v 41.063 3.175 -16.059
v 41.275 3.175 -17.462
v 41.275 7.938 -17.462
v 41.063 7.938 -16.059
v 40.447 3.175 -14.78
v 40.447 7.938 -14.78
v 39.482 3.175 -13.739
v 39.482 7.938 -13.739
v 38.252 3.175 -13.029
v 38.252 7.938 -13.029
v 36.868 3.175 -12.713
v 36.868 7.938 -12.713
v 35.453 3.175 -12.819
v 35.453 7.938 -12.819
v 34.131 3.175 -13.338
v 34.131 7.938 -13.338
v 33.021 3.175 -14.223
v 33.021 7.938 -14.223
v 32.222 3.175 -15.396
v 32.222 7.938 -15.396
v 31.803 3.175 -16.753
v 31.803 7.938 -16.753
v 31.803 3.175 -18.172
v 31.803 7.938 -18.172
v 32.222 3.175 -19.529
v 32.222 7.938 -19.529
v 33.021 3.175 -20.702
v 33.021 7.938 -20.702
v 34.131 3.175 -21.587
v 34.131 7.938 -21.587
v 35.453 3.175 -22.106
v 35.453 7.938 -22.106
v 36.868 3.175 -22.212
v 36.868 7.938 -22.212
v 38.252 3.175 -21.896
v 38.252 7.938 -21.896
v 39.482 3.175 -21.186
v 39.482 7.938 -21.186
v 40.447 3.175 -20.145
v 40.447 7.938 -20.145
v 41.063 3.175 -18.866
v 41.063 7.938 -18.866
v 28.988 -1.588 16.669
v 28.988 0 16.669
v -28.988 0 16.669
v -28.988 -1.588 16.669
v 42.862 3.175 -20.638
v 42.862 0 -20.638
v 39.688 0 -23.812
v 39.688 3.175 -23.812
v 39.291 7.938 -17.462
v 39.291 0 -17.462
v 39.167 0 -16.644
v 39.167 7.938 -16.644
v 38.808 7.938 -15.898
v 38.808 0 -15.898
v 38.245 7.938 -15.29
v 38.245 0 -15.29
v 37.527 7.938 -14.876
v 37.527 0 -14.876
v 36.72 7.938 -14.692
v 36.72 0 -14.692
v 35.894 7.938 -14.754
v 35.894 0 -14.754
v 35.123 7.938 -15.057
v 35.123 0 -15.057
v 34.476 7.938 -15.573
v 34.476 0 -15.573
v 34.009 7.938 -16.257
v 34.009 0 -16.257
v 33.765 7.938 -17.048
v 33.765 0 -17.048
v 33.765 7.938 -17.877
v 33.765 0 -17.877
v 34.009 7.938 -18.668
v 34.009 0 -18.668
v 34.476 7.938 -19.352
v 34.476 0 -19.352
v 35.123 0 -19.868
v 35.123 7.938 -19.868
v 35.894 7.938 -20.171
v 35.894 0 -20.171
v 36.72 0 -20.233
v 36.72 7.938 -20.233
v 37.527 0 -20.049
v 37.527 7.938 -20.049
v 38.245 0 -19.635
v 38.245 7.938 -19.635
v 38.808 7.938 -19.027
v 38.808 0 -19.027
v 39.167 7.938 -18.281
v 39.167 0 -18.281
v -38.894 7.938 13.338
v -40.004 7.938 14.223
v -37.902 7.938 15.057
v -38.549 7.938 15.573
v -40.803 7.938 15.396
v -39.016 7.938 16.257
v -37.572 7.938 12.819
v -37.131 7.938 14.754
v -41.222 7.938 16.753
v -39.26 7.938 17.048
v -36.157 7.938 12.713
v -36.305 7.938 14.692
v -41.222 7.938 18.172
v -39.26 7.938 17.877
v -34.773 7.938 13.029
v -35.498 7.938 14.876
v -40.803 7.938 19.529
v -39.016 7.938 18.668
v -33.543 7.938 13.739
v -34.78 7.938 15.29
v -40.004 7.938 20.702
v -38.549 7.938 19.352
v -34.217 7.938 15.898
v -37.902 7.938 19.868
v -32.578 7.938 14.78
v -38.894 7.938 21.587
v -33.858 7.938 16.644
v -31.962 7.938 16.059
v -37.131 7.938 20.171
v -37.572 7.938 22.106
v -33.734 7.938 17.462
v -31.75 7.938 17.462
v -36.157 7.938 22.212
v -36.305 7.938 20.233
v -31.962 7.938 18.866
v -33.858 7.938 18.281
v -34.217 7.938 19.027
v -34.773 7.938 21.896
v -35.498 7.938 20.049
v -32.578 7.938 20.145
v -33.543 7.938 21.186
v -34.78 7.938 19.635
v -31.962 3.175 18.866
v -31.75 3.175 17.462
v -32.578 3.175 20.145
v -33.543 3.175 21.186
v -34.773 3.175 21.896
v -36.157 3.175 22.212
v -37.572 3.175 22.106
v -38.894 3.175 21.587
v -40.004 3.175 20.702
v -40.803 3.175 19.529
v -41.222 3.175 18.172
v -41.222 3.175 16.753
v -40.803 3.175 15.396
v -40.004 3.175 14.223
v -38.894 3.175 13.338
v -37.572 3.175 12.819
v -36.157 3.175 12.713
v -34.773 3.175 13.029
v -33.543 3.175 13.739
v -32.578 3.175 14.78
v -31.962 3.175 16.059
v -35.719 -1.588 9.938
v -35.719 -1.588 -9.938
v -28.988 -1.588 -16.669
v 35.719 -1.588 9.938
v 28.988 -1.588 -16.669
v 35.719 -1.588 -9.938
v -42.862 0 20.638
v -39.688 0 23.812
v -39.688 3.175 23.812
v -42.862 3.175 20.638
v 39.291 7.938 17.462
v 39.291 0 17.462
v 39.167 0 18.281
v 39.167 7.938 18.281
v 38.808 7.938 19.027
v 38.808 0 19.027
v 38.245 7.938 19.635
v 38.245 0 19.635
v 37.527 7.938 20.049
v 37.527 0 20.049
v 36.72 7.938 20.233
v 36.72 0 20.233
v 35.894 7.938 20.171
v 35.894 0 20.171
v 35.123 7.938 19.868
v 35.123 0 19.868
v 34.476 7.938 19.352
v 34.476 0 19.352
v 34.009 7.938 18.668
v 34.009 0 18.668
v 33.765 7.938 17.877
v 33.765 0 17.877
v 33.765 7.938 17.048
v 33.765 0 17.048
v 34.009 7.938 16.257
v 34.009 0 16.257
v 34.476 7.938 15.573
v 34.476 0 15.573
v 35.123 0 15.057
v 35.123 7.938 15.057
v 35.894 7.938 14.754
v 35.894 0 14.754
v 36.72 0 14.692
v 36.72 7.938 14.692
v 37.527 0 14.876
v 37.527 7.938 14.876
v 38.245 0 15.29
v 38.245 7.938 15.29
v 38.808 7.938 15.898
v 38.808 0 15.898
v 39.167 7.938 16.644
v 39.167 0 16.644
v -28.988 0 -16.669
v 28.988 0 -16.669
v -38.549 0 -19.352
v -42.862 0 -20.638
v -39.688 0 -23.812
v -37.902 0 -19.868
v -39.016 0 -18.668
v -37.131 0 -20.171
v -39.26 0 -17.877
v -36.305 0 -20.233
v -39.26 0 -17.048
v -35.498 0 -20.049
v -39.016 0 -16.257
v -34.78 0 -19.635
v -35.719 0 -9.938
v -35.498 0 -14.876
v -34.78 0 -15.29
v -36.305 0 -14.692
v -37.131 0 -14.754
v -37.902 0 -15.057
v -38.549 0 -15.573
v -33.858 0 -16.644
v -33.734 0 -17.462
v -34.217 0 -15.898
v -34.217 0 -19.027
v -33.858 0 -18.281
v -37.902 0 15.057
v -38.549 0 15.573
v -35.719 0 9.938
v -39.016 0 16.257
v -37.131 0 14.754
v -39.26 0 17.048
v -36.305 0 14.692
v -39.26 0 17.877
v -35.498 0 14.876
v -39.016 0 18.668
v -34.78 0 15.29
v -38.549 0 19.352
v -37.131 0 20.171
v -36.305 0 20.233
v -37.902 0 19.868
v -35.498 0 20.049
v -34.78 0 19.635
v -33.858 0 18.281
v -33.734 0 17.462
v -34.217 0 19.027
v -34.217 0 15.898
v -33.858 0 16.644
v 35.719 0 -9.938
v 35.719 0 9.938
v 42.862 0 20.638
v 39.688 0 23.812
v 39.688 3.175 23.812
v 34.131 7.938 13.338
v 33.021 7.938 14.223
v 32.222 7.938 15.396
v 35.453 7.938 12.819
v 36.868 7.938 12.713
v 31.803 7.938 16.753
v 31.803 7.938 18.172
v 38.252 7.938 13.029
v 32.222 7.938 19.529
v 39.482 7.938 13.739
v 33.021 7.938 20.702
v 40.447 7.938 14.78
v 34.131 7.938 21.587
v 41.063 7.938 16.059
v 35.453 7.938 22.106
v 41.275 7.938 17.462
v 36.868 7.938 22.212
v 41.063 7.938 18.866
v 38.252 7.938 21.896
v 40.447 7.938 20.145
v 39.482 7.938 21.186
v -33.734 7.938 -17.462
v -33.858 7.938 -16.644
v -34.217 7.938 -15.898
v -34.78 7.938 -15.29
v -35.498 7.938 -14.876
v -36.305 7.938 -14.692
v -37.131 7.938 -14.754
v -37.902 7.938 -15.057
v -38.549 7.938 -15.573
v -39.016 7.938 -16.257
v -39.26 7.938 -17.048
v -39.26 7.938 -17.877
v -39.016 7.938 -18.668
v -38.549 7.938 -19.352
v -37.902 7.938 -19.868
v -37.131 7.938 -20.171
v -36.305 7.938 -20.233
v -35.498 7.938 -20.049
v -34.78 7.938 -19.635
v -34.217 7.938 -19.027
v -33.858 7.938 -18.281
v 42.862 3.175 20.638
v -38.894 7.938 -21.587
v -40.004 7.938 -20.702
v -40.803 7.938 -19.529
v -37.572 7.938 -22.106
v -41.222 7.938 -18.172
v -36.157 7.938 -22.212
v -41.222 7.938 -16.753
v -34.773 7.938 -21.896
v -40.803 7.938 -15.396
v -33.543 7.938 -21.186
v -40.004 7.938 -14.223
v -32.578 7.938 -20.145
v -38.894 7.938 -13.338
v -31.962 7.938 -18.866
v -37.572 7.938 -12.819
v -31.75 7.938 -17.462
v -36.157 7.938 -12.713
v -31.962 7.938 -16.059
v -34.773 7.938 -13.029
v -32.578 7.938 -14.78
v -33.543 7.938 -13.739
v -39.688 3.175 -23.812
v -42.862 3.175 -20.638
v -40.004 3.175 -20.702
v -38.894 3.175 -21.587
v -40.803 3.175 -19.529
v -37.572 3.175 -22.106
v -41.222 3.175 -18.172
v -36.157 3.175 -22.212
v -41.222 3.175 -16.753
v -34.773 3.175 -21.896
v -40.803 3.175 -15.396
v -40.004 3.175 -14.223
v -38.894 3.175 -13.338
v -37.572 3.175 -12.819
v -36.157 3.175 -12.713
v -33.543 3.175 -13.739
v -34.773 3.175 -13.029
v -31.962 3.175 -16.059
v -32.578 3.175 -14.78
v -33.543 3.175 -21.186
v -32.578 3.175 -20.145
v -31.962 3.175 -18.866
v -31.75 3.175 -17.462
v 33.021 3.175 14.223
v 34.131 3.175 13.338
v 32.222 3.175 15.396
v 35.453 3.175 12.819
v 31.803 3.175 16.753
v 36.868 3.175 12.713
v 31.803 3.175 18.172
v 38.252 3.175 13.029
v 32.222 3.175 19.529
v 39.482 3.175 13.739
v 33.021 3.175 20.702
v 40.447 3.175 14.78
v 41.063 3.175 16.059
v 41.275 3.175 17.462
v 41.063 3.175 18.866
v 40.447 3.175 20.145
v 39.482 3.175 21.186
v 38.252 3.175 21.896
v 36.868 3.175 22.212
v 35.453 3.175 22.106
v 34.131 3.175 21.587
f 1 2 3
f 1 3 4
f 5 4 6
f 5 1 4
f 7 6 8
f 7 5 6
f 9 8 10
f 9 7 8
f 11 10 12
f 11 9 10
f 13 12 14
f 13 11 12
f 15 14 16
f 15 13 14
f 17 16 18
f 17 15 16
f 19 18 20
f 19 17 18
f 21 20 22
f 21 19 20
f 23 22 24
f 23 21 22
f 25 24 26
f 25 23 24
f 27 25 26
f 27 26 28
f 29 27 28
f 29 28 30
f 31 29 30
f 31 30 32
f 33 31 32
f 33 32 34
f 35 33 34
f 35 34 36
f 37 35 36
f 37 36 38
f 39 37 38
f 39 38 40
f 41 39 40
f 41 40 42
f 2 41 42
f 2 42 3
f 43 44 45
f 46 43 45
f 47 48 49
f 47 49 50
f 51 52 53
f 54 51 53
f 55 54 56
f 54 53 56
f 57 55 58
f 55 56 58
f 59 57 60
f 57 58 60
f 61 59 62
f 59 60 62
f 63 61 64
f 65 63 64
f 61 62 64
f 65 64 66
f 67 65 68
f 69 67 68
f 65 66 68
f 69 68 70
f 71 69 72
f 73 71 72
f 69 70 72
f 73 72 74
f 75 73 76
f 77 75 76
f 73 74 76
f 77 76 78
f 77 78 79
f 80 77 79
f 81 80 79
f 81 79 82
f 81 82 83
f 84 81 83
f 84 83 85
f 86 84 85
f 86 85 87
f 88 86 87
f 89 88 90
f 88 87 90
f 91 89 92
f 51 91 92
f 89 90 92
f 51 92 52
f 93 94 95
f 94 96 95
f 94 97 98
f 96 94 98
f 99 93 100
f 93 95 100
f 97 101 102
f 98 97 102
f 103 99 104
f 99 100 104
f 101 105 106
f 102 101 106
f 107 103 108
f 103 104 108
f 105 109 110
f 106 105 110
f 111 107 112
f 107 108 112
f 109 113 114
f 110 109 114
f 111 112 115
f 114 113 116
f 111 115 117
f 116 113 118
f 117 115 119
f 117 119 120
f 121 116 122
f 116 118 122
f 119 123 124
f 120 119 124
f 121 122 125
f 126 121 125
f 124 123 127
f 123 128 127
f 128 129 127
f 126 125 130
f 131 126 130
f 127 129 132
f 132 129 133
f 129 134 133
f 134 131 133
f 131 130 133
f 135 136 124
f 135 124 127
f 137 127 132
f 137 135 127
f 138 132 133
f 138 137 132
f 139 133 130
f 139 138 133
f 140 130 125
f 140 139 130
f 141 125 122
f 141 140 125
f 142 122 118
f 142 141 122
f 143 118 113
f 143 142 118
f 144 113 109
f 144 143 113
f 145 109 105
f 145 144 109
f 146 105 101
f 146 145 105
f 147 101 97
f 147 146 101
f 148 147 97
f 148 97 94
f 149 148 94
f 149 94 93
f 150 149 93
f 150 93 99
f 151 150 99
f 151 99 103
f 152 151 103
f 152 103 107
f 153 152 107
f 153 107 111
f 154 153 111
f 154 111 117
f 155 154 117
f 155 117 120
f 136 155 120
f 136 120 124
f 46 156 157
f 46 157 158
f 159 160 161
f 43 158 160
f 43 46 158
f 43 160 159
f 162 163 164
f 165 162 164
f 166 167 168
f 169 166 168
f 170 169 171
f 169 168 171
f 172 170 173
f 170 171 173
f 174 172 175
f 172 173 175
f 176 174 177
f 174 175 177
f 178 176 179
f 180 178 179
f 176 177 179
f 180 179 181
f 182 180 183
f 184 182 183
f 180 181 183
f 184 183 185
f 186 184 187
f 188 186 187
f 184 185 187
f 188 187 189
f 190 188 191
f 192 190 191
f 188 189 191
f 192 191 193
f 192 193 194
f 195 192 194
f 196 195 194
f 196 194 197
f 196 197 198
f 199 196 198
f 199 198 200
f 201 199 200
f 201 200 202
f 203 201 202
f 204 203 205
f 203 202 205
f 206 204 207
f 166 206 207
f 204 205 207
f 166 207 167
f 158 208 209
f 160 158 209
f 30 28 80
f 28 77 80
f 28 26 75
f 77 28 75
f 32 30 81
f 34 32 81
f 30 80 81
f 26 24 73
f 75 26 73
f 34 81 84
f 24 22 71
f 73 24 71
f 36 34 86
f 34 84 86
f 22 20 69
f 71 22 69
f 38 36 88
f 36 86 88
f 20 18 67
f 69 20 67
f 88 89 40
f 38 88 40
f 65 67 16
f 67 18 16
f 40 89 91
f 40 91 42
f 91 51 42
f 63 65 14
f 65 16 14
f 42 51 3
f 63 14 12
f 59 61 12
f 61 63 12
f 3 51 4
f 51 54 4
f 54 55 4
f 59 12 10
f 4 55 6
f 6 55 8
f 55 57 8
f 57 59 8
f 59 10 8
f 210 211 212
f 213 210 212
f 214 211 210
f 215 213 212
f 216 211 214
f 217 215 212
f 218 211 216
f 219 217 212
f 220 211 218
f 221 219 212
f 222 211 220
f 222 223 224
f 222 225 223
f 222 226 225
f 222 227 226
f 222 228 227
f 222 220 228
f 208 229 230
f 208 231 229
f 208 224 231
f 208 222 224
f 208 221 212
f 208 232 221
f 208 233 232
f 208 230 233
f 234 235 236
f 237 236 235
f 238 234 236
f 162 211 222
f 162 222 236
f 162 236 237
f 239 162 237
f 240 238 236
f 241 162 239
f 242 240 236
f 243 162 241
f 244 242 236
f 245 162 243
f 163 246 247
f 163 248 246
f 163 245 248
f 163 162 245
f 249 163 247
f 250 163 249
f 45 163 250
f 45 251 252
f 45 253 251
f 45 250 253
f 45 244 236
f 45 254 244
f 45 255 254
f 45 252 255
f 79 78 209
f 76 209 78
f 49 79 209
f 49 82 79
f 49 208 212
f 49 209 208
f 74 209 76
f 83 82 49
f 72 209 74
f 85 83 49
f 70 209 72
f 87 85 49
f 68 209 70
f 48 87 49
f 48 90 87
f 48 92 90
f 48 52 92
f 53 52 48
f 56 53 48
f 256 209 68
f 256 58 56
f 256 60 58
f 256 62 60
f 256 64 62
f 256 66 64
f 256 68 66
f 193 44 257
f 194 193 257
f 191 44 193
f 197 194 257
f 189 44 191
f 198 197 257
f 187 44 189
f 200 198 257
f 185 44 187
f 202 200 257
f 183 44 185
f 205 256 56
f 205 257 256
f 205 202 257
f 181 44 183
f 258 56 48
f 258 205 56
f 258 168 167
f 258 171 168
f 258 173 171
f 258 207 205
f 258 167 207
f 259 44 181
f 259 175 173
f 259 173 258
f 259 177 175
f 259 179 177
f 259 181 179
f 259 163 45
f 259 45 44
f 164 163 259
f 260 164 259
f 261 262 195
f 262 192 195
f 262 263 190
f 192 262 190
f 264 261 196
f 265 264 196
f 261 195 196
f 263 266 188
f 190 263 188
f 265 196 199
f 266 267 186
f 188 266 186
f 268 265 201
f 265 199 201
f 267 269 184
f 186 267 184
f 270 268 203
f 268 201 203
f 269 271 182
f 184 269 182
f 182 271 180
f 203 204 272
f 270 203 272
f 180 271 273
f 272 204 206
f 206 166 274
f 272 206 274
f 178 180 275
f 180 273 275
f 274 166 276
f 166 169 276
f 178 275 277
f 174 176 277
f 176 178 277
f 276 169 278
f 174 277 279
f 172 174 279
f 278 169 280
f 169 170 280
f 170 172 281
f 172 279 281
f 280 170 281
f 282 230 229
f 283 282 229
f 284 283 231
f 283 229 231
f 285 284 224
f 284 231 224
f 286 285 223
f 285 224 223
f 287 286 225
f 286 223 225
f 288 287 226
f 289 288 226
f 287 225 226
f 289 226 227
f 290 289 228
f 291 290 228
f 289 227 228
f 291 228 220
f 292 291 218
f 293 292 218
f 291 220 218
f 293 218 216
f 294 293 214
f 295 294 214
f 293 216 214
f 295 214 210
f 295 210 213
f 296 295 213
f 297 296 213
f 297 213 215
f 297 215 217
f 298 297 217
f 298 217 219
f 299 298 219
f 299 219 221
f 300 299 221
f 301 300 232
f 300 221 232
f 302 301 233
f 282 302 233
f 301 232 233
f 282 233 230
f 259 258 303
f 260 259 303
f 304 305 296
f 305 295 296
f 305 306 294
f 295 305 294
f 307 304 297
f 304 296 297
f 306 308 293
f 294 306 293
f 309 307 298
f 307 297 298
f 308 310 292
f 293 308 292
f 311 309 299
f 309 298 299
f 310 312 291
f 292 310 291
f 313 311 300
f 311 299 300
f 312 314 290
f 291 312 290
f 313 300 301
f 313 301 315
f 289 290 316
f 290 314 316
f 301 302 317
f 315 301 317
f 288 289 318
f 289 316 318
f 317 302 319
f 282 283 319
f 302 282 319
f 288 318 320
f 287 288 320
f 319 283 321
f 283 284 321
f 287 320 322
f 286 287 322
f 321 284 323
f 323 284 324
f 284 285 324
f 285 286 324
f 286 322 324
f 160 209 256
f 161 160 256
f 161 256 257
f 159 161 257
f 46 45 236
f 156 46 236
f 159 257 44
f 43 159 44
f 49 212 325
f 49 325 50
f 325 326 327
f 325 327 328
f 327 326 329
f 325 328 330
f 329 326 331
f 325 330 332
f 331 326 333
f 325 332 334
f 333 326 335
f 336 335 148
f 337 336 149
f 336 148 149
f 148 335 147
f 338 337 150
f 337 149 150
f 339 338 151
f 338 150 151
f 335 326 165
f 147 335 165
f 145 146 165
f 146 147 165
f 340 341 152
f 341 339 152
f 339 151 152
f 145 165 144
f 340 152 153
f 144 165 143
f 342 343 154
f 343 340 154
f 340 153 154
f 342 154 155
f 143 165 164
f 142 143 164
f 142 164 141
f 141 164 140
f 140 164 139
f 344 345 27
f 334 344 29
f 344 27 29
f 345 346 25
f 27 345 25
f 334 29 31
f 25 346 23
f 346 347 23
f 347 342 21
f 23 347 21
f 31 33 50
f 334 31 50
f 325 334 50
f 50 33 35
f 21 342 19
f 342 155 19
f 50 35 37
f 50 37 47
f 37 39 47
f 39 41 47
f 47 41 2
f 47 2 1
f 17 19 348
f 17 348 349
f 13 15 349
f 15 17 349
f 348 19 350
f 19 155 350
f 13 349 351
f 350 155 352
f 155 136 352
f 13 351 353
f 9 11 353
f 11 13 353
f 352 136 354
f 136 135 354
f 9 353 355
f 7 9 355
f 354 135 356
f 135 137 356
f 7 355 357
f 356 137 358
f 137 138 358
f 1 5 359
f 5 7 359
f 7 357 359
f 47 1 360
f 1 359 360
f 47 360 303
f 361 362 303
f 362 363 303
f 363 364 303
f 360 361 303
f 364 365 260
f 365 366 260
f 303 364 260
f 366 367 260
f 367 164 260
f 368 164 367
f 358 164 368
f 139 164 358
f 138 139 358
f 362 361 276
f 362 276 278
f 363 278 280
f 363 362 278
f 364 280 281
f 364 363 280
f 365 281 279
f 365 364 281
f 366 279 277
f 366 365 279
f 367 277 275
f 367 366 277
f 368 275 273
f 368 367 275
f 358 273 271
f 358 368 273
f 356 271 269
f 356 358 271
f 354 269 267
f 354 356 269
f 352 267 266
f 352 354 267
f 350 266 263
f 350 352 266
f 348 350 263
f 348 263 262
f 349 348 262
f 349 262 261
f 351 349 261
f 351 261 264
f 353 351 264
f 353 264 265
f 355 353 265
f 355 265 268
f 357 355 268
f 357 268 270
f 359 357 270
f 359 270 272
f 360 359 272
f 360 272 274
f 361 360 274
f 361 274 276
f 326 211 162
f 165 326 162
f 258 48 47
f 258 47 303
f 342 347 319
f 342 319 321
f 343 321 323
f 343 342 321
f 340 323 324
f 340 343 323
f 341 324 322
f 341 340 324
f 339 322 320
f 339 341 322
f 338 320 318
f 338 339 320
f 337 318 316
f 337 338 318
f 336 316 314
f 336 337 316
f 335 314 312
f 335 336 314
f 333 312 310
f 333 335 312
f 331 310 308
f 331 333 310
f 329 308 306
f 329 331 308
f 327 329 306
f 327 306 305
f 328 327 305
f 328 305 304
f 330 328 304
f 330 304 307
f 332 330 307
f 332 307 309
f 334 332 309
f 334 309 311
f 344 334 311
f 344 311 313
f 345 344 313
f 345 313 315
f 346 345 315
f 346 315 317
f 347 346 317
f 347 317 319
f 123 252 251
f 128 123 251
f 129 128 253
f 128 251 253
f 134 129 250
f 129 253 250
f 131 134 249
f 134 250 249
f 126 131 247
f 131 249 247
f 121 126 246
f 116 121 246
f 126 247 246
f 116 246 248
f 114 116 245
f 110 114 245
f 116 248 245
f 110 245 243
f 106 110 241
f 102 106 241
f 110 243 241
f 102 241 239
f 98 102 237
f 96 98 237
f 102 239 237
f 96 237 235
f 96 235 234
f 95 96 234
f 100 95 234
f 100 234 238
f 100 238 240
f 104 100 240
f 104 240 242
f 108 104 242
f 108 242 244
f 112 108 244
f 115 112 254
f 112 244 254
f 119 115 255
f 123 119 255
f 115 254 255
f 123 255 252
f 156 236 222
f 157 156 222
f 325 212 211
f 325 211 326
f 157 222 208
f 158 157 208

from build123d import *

# Parameters (mm, degrees)
F3_W      = 85.725
F3_H      = 47.625
F4_DEPTH  = 3.175
F6_DEPTH  = 1.5875
F7_R      = 4.7625
F8_DEPTH  = 7.9375
F9_R      = 2.778125
F10_DEPTH = 7.9375
F11_SIZE  = 3.175


with BuildPart() as f4:
    # F3 (on Front) → F4 (new body, through all)
    with BuildSketch(Plane.XZ):
        Rectangle(F3_W, F3_H)
    extrude(amount=-F4_DEPTH)

    # F5 (on Front) → F6 (join)
    with BuildSketch(Plane.XZ):
        Polygon((28.98775, 16.66875), (-28.98775, 16.66875), (-35.71875, 9.93775), (-35.71875, -9.93775), (-28.98775, -16.66875), (28.98775, -16.66875), (35.71875, -9.93775), (35.71875, 9.93775), align=None)
    extrude(amount=F6_DEPTH)

    # F7 (on Front) → F8 (join)
    with BuildSketch(Plane.XZ):
        with Locations((36.5125, 17.4625)):
            Circle(F7_R)
        with Locations((-36.5125, 17.4625)):
            Circle(F7_R)
        with Locations((-36.5125, -17.4625)):
            Circle(F7_R)
        with Locations((36.5125, -17.4625)):
            Circle(F7_R)
    extrude(amount=-F8_DEPTH)

    # F9 (on Front) → F10 (cut, through all)
    with BuildSketch(Plane.XZ):
        with Locations((36.5125, 17.4625)):
            Circle(F9_R)
        with Locations((36.5125, -17.4625)):
            Circle(F9_R)
        with Locations((-36.5125, 17.4625)):
            Circle(F9_R)
        with Locations((-36.5125, -17.4625)):
            Circle(F9_R)
    extrude(amount=-F10_DEPTH, mode=Mode.SUBTRACT)

    # F11
    f11_edges = [f4.edges().sort_by_distance(p)[0] for p in [
        (42.8625, 1.5875, -23.8125),
        (42.8625, 1.5875, 23.8125),
        (-42.8625, 1.5875, -23.8125),
        (-42.8625, 1.5875, 23.8125),
    ]]
    chamfer(f11_edges, length=F11_SIZE)


solid = f4.part
